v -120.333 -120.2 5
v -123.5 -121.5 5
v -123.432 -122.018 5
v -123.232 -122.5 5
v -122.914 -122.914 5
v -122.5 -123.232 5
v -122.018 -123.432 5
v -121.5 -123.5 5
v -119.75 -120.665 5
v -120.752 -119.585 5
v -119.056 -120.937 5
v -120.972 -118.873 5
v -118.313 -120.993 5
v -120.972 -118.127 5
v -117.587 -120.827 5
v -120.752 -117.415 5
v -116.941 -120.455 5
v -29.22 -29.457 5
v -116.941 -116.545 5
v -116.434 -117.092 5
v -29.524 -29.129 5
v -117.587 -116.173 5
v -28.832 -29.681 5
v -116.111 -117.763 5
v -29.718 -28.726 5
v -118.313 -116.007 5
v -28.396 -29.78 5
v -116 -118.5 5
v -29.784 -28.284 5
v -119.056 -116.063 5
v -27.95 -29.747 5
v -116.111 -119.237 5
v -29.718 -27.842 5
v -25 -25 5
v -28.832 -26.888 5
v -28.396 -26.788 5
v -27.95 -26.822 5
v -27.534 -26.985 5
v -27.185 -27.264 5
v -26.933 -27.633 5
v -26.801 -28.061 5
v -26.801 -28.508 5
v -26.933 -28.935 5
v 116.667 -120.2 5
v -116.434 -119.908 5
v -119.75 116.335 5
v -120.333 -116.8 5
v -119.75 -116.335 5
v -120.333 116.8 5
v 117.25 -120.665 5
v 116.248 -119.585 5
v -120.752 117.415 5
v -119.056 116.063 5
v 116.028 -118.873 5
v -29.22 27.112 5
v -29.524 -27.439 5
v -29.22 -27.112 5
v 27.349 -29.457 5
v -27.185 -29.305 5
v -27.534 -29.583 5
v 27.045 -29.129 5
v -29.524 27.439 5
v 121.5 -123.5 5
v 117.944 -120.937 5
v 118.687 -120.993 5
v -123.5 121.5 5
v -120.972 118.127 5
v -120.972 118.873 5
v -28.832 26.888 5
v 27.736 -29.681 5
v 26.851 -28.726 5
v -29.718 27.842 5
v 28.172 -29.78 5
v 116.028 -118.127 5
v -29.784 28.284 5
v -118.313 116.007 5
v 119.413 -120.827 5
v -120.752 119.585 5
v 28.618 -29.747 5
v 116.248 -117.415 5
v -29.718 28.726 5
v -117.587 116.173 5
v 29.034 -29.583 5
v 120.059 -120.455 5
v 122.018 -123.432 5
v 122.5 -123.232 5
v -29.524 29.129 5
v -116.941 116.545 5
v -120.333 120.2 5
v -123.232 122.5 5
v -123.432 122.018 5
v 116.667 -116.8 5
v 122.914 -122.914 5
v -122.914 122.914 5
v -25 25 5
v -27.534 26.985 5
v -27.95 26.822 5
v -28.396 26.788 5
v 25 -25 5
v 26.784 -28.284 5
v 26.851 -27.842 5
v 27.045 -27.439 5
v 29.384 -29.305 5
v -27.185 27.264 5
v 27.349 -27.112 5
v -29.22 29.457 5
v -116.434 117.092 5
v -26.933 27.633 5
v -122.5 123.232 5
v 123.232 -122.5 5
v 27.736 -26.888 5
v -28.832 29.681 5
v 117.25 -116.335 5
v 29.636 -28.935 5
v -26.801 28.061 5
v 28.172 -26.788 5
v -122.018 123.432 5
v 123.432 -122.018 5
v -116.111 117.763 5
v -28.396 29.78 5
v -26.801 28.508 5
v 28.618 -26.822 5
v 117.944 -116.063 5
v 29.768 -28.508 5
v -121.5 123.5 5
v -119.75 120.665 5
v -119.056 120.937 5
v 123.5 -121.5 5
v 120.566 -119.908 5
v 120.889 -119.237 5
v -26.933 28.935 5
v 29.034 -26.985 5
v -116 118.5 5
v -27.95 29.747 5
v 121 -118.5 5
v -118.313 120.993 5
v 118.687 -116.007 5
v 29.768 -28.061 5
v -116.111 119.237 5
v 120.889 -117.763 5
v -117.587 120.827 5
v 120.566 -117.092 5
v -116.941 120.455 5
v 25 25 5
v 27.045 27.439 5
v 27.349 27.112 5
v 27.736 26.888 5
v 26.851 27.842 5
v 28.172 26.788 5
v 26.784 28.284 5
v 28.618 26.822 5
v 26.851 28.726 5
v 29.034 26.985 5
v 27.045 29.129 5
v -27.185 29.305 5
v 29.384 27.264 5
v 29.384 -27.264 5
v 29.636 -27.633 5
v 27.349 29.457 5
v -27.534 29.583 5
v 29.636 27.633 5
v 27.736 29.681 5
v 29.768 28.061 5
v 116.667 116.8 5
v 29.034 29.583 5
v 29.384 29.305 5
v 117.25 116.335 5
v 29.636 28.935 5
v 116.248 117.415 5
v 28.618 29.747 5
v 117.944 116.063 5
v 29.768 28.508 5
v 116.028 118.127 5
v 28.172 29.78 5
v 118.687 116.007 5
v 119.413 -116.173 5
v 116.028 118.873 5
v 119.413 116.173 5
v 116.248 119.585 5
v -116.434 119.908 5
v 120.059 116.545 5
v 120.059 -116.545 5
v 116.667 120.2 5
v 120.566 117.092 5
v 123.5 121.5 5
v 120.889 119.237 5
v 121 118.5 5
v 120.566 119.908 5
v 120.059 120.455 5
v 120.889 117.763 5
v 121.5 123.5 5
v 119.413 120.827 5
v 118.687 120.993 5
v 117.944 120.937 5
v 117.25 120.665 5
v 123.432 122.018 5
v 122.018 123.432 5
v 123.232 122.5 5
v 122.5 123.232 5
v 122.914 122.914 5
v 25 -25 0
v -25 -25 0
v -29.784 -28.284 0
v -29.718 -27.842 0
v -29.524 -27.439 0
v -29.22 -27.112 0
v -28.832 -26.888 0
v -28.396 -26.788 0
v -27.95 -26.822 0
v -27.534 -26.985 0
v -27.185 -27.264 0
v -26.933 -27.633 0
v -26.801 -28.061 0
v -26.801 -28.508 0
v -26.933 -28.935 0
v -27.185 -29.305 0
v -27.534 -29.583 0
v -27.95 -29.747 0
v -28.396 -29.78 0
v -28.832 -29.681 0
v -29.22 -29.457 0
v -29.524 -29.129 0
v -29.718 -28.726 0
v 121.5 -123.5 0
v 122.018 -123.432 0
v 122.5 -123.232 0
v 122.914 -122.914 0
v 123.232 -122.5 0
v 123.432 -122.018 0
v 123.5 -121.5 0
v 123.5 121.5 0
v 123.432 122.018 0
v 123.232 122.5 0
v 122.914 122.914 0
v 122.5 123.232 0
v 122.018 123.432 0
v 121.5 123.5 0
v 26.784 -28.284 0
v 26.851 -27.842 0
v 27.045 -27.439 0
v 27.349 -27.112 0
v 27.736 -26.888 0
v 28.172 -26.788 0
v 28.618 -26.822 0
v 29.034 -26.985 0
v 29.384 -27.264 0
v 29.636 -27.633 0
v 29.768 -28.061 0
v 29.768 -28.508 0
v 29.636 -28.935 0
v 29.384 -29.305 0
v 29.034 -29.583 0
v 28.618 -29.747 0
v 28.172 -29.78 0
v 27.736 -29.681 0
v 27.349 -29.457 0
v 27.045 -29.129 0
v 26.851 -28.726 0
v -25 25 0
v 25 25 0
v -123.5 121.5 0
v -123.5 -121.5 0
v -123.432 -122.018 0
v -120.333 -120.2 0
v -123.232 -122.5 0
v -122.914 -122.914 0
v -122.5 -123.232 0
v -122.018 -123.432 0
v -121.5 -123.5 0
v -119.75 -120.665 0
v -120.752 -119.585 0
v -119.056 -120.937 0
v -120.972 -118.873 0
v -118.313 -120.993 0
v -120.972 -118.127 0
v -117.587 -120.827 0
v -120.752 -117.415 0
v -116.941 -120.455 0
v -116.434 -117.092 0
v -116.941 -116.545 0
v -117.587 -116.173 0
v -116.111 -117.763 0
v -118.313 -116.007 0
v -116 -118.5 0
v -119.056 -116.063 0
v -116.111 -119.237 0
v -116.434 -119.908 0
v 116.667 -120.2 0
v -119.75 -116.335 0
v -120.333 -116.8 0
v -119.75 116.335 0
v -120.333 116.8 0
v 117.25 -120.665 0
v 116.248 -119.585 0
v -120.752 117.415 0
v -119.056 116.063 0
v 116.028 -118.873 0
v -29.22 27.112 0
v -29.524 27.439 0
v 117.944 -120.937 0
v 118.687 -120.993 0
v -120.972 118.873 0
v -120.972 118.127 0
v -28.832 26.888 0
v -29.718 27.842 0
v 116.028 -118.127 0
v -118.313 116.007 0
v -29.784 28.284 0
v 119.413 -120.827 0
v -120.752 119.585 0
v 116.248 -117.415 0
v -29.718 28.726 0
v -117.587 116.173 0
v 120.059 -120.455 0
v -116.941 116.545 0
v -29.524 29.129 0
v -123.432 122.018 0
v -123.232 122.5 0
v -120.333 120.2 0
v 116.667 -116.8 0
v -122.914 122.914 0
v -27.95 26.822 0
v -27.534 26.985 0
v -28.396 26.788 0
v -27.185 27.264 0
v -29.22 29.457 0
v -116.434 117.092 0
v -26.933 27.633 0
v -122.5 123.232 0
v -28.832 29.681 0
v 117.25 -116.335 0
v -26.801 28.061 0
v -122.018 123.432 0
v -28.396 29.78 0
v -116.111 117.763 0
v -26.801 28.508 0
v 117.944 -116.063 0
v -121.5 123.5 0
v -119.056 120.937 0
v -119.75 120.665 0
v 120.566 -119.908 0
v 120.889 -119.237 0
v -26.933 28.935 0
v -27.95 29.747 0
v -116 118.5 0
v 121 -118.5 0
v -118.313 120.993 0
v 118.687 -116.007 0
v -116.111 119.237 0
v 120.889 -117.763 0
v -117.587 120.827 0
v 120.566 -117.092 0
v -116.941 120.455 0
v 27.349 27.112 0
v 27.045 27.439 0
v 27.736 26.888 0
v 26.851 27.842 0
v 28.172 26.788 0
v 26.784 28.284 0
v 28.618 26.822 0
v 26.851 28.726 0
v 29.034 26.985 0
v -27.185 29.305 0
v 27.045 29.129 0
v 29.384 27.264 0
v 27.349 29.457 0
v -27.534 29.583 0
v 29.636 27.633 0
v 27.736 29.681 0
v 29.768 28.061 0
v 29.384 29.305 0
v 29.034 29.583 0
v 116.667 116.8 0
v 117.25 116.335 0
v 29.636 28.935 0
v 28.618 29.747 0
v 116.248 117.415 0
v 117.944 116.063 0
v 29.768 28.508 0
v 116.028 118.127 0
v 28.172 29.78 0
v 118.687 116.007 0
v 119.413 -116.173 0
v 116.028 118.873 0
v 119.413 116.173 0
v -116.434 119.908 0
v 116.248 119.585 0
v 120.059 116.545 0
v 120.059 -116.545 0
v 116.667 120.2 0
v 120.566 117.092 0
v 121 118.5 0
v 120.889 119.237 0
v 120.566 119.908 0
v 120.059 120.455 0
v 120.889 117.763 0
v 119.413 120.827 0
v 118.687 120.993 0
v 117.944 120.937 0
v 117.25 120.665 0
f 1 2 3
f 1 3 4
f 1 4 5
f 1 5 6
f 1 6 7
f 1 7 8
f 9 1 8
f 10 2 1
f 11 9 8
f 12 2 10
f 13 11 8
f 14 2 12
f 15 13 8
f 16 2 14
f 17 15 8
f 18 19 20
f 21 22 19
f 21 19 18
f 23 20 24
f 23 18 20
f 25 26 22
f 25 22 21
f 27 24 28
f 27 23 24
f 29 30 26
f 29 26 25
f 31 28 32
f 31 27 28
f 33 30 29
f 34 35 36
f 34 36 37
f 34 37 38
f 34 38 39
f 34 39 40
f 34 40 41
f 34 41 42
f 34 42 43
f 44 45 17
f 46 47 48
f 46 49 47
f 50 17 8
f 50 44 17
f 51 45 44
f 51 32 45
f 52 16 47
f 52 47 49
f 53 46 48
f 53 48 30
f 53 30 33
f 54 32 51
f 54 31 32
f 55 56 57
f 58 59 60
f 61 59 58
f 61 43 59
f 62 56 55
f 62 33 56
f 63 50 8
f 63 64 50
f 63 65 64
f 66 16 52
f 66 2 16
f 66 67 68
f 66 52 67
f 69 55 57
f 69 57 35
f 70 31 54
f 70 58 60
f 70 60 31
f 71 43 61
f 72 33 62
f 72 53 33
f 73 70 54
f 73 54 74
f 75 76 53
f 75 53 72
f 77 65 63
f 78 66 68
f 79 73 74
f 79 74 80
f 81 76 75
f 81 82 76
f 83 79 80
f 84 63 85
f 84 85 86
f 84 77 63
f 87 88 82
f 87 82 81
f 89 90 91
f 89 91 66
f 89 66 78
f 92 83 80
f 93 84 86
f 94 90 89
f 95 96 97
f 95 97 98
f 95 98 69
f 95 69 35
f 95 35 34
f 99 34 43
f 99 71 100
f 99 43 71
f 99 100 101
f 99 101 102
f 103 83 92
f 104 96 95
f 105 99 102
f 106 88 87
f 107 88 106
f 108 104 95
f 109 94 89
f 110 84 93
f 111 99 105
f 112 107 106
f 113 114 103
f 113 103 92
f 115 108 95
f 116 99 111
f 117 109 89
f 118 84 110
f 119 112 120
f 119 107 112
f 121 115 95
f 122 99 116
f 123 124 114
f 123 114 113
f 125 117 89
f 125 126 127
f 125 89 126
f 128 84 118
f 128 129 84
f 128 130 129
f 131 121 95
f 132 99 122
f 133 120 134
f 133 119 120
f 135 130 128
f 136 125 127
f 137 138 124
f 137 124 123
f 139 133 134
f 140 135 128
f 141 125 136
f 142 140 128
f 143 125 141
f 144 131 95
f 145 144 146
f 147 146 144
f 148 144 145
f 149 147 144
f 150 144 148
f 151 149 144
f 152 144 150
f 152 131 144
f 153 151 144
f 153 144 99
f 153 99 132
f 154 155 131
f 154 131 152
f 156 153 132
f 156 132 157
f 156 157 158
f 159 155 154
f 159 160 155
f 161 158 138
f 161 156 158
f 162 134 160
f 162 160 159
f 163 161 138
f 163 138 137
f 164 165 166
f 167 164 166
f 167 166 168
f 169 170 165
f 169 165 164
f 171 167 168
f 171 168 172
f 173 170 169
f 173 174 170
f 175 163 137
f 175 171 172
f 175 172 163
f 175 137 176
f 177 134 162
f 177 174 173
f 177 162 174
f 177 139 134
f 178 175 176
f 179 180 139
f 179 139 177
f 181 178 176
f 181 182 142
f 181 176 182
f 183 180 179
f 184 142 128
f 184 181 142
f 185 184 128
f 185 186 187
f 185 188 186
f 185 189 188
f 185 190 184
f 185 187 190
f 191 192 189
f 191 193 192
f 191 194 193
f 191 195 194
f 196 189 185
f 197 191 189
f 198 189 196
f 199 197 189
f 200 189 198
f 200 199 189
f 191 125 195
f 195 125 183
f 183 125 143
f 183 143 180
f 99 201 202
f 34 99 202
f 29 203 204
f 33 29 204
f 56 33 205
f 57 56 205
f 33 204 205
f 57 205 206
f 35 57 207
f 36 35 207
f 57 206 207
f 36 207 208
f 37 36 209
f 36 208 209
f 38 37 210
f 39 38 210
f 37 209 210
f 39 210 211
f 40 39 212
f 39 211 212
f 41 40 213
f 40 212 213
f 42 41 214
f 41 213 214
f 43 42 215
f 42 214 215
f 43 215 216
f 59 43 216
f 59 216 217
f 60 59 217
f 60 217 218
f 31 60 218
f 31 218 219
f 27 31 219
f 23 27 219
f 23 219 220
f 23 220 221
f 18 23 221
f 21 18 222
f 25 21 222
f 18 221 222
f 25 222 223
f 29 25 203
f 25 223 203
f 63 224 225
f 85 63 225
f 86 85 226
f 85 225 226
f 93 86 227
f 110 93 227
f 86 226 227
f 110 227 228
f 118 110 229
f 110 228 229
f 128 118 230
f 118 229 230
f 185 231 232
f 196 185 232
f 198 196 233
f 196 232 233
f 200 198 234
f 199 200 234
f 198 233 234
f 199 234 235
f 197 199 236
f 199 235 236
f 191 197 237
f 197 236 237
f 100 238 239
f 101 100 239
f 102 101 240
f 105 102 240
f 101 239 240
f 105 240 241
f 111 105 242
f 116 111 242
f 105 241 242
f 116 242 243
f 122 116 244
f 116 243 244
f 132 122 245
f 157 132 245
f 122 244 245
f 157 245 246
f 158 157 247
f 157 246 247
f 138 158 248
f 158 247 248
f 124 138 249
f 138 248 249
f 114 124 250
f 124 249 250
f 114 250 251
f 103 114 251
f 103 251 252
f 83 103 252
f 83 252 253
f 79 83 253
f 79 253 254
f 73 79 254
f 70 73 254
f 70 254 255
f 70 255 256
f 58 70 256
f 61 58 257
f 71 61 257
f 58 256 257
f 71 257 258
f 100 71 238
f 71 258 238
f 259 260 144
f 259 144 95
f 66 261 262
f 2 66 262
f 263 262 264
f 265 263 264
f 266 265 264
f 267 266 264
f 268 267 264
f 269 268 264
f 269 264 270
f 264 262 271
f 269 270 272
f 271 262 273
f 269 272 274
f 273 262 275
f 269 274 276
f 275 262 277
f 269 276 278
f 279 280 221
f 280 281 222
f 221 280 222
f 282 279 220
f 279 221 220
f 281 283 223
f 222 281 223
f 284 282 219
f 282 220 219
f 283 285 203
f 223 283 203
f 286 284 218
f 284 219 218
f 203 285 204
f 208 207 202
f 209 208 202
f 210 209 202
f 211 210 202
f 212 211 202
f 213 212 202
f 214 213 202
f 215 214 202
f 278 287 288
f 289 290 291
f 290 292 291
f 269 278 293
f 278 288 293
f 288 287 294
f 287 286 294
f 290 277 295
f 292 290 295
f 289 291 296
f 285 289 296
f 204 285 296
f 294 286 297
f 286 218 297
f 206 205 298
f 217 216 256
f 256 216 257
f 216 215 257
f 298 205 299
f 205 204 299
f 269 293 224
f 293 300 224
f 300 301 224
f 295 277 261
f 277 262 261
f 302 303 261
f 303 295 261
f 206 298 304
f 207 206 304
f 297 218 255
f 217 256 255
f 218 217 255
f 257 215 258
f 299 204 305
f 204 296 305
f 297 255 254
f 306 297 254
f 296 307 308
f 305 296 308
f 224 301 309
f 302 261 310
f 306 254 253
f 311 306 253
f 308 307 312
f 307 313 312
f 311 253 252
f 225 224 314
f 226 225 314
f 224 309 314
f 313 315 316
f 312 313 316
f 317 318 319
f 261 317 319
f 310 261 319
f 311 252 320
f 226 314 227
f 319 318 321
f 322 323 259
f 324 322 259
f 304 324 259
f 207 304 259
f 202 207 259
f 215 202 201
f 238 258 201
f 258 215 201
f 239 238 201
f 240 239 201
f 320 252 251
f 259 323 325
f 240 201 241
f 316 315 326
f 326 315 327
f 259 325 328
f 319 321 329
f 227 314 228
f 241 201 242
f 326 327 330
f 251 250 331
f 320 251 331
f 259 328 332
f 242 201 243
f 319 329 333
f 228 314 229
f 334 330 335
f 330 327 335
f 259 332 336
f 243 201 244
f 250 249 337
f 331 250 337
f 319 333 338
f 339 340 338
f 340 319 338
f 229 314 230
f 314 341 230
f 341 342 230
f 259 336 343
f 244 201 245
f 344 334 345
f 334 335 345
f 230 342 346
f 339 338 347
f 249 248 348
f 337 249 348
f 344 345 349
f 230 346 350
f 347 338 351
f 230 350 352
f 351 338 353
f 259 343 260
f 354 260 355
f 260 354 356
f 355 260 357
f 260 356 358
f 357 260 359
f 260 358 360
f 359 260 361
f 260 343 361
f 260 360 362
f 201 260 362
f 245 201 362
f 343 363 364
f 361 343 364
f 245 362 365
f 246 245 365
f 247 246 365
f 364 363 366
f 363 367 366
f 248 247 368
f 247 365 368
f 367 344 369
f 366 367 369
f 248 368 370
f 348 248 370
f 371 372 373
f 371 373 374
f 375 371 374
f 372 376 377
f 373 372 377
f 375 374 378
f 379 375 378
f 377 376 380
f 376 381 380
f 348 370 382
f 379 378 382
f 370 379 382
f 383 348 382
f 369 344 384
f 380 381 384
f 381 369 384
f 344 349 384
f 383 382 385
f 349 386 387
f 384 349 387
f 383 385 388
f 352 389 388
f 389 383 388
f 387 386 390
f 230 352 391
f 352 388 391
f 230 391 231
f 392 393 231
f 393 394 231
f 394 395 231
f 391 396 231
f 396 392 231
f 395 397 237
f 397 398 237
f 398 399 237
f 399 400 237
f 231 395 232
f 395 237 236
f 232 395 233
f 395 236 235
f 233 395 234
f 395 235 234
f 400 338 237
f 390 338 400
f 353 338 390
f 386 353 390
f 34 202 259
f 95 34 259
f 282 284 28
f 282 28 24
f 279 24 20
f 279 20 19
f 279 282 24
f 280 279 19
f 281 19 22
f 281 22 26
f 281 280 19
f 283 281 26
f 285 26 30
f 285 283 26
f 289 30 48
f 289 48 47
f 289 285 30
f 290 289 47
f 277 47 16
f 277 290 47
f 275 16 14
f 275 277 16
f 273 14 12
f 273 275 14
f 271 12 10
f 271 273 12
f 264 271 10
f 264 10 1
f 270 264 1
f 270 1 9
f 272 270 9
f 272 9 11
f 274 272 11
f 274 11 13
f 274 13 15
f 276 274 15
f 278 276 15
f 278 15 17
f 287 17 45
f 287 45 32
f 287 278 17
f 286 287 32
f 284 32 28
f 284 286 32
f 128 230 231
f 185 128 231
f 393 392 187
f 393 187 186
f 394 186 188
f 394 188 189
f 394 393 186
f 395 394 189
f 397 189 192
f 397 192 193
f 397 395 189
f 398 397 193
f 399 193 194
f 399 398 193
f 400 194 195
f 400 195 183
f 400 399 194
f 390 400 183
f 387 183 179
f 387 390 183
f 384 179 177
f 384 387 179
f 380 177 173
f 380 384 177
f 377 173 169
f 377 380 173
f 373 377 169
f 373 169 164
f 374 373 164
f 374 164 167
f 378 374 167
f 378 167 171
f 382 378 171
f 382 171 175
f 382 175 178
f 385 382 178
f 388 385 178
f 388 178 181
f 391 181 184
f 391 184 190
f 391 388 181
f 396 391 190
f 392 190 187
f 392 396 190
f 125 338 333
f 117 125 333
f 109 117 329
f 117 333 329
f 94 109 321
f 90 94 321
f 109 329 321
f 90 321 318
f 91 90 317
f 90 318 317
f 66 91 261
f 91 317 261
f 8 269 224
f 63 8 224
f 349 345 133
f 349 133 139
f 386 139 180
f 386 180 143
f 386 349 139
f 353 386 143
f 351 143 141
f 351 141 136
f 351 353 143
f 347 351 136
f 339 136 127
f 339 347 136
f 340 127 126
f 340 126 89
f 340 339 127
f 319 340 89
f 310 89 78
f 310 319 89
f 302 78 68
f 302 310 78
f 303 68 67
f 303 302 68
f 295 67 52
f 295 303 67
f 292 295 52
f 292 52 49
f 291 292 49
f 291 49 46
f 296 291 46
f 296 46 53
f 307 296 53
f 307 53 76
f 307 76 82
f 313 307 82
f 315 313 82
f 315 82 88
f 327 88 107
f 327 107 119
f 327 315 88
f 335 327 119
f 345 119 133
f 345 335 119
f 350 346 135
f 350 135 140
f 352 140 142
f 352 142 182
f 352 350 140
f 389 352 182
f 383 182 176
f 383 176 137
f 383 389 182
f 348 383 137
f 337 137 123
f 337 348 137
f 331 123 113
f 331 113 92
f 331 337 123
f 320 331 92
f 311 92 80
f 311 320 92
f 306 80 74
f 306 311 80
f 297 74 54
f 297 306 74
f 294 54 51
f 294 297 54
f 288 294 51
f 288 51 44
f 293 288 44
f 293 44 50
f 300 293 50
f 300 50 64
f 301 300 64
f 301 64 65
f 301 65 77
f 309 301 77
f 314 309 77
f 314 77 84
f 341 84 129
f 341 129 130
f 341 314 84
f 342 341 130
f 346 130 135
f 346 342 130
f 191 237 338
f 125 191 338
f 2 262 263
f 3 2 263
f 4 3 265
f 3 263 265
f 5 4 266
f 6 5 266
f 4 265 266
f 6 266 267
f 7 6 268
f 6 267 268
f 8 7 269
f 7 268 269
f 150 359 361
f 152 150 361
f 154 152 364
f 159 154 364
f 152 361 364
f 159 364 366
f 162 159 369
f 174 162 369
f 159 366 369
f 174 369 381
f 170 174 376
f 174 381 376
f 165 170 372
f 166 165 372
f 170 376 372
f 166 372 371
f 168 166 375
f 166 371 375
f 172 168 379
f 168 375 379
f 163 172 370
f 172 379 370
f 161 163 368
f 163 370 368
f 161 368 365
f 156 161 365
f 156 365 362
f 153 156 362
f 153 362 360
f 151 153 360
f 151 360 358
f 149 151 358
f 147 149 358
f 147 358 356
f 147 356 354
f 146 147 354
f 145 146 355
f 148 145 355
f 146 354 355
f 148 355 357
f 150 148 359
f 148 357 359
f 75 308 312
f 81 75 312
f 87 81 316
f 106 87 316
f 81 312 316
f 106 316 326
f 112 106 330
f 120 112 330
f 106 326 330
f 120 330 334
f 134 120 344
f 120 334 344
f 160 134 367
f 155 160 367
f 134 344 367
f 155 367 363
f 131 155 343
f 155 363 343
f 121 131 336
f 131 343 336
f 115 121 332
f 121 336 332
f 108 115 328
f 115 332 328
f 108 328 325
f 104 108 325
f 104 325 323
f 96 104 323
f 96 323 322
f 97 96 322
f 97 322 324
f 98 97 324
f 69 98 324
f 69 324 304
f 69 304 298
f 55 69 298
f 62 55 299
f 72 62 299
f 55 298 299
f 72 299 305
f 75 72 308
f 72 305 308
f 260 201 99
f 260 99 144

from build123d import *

# Parameters (mm, degrees)
SKETCH1_R           = 2.5
BOSS_EXTRUDE1_DEPTH = 5
SKETCH2_R           = 1.5
SKETCH2_W           = 50
SKETCH2_H           = 50
CUT_EXTRUDE1_DEPTH  = 5


with BuildPart() as part:
    # Sketch1 → Boss-Extrude1 (new body)
    with BuildSketch(Plane.XY):
        with BuildLine():
            Line((-123.5, 121.5), (-123.5, -121.5))
            ThreePointArc((-123.5, -121.5), (-122.914213562, -122.914213562), (-121.5, -123.5))
            Line((-121.5, -123.5), (121.5, -123.5))
            ThreePointArc((121.5, -123.5), (122.914213562, -122.914213562), (123.5, -121.5))
            Line((123.5, -121.5), (123.5, 121.5))
            ThreePointArc((123.5, 121.5), (122.914213562, 122.914213562), (121.5, 123.5))
            Line((121.5, 123.5), (-121.5, 123.5))
            ThreePointArc((-121.5, 123.5), (-122.914213562, 122.914213562), (-123.5, 121.5))
        make_face()
        with Locations((-118.5, 118.5)):
            Circle(SKETCH1_R, mode=Mode.SUBTRACT)
        with Locations((118.5, 118.5)):
            Circle(SKETCH1_R, mode=Mode.SUBTRACT)
        with Locations((118.5, -118.5)):
            Circle(SKETCH1_R, mode=Mode.SUBTRACT)
        with Locations((-118.5, -118.5)):
            Circle(SKETCH1_R, mode=Mode.SUBTRACT)
    extrude(amount=BOSS_EXTRUDE1_DEPTH)

    # Sketch2 → Cut-Extrude1 (cut)
    with BuildSketch(Plane(origin=(0, 0, 0), x_dir=(-1, 0, 0), z_dir=(0, 0, -1))):
        with Locations((28.284271247, 28.284271247)):
            Circle(SKETCH2_R)
        with Locations((28.284271247, -28.284271247)):
            Circle(SKETCH2_R)
        with Locations((-28.284271247, -28.284271247)):
            Circle(SKETCH2_R)
        with Locations((-28.284271247, 28.284271247)):
            Circle(SKETCH2_R)
        Rectangle(SKETCH2_W, SKETCH2_H)
    extrude(amount=-CUT_EXTRUDE1_DEPTH, mode=Mode.SUBTRACT)


solid = part.part
